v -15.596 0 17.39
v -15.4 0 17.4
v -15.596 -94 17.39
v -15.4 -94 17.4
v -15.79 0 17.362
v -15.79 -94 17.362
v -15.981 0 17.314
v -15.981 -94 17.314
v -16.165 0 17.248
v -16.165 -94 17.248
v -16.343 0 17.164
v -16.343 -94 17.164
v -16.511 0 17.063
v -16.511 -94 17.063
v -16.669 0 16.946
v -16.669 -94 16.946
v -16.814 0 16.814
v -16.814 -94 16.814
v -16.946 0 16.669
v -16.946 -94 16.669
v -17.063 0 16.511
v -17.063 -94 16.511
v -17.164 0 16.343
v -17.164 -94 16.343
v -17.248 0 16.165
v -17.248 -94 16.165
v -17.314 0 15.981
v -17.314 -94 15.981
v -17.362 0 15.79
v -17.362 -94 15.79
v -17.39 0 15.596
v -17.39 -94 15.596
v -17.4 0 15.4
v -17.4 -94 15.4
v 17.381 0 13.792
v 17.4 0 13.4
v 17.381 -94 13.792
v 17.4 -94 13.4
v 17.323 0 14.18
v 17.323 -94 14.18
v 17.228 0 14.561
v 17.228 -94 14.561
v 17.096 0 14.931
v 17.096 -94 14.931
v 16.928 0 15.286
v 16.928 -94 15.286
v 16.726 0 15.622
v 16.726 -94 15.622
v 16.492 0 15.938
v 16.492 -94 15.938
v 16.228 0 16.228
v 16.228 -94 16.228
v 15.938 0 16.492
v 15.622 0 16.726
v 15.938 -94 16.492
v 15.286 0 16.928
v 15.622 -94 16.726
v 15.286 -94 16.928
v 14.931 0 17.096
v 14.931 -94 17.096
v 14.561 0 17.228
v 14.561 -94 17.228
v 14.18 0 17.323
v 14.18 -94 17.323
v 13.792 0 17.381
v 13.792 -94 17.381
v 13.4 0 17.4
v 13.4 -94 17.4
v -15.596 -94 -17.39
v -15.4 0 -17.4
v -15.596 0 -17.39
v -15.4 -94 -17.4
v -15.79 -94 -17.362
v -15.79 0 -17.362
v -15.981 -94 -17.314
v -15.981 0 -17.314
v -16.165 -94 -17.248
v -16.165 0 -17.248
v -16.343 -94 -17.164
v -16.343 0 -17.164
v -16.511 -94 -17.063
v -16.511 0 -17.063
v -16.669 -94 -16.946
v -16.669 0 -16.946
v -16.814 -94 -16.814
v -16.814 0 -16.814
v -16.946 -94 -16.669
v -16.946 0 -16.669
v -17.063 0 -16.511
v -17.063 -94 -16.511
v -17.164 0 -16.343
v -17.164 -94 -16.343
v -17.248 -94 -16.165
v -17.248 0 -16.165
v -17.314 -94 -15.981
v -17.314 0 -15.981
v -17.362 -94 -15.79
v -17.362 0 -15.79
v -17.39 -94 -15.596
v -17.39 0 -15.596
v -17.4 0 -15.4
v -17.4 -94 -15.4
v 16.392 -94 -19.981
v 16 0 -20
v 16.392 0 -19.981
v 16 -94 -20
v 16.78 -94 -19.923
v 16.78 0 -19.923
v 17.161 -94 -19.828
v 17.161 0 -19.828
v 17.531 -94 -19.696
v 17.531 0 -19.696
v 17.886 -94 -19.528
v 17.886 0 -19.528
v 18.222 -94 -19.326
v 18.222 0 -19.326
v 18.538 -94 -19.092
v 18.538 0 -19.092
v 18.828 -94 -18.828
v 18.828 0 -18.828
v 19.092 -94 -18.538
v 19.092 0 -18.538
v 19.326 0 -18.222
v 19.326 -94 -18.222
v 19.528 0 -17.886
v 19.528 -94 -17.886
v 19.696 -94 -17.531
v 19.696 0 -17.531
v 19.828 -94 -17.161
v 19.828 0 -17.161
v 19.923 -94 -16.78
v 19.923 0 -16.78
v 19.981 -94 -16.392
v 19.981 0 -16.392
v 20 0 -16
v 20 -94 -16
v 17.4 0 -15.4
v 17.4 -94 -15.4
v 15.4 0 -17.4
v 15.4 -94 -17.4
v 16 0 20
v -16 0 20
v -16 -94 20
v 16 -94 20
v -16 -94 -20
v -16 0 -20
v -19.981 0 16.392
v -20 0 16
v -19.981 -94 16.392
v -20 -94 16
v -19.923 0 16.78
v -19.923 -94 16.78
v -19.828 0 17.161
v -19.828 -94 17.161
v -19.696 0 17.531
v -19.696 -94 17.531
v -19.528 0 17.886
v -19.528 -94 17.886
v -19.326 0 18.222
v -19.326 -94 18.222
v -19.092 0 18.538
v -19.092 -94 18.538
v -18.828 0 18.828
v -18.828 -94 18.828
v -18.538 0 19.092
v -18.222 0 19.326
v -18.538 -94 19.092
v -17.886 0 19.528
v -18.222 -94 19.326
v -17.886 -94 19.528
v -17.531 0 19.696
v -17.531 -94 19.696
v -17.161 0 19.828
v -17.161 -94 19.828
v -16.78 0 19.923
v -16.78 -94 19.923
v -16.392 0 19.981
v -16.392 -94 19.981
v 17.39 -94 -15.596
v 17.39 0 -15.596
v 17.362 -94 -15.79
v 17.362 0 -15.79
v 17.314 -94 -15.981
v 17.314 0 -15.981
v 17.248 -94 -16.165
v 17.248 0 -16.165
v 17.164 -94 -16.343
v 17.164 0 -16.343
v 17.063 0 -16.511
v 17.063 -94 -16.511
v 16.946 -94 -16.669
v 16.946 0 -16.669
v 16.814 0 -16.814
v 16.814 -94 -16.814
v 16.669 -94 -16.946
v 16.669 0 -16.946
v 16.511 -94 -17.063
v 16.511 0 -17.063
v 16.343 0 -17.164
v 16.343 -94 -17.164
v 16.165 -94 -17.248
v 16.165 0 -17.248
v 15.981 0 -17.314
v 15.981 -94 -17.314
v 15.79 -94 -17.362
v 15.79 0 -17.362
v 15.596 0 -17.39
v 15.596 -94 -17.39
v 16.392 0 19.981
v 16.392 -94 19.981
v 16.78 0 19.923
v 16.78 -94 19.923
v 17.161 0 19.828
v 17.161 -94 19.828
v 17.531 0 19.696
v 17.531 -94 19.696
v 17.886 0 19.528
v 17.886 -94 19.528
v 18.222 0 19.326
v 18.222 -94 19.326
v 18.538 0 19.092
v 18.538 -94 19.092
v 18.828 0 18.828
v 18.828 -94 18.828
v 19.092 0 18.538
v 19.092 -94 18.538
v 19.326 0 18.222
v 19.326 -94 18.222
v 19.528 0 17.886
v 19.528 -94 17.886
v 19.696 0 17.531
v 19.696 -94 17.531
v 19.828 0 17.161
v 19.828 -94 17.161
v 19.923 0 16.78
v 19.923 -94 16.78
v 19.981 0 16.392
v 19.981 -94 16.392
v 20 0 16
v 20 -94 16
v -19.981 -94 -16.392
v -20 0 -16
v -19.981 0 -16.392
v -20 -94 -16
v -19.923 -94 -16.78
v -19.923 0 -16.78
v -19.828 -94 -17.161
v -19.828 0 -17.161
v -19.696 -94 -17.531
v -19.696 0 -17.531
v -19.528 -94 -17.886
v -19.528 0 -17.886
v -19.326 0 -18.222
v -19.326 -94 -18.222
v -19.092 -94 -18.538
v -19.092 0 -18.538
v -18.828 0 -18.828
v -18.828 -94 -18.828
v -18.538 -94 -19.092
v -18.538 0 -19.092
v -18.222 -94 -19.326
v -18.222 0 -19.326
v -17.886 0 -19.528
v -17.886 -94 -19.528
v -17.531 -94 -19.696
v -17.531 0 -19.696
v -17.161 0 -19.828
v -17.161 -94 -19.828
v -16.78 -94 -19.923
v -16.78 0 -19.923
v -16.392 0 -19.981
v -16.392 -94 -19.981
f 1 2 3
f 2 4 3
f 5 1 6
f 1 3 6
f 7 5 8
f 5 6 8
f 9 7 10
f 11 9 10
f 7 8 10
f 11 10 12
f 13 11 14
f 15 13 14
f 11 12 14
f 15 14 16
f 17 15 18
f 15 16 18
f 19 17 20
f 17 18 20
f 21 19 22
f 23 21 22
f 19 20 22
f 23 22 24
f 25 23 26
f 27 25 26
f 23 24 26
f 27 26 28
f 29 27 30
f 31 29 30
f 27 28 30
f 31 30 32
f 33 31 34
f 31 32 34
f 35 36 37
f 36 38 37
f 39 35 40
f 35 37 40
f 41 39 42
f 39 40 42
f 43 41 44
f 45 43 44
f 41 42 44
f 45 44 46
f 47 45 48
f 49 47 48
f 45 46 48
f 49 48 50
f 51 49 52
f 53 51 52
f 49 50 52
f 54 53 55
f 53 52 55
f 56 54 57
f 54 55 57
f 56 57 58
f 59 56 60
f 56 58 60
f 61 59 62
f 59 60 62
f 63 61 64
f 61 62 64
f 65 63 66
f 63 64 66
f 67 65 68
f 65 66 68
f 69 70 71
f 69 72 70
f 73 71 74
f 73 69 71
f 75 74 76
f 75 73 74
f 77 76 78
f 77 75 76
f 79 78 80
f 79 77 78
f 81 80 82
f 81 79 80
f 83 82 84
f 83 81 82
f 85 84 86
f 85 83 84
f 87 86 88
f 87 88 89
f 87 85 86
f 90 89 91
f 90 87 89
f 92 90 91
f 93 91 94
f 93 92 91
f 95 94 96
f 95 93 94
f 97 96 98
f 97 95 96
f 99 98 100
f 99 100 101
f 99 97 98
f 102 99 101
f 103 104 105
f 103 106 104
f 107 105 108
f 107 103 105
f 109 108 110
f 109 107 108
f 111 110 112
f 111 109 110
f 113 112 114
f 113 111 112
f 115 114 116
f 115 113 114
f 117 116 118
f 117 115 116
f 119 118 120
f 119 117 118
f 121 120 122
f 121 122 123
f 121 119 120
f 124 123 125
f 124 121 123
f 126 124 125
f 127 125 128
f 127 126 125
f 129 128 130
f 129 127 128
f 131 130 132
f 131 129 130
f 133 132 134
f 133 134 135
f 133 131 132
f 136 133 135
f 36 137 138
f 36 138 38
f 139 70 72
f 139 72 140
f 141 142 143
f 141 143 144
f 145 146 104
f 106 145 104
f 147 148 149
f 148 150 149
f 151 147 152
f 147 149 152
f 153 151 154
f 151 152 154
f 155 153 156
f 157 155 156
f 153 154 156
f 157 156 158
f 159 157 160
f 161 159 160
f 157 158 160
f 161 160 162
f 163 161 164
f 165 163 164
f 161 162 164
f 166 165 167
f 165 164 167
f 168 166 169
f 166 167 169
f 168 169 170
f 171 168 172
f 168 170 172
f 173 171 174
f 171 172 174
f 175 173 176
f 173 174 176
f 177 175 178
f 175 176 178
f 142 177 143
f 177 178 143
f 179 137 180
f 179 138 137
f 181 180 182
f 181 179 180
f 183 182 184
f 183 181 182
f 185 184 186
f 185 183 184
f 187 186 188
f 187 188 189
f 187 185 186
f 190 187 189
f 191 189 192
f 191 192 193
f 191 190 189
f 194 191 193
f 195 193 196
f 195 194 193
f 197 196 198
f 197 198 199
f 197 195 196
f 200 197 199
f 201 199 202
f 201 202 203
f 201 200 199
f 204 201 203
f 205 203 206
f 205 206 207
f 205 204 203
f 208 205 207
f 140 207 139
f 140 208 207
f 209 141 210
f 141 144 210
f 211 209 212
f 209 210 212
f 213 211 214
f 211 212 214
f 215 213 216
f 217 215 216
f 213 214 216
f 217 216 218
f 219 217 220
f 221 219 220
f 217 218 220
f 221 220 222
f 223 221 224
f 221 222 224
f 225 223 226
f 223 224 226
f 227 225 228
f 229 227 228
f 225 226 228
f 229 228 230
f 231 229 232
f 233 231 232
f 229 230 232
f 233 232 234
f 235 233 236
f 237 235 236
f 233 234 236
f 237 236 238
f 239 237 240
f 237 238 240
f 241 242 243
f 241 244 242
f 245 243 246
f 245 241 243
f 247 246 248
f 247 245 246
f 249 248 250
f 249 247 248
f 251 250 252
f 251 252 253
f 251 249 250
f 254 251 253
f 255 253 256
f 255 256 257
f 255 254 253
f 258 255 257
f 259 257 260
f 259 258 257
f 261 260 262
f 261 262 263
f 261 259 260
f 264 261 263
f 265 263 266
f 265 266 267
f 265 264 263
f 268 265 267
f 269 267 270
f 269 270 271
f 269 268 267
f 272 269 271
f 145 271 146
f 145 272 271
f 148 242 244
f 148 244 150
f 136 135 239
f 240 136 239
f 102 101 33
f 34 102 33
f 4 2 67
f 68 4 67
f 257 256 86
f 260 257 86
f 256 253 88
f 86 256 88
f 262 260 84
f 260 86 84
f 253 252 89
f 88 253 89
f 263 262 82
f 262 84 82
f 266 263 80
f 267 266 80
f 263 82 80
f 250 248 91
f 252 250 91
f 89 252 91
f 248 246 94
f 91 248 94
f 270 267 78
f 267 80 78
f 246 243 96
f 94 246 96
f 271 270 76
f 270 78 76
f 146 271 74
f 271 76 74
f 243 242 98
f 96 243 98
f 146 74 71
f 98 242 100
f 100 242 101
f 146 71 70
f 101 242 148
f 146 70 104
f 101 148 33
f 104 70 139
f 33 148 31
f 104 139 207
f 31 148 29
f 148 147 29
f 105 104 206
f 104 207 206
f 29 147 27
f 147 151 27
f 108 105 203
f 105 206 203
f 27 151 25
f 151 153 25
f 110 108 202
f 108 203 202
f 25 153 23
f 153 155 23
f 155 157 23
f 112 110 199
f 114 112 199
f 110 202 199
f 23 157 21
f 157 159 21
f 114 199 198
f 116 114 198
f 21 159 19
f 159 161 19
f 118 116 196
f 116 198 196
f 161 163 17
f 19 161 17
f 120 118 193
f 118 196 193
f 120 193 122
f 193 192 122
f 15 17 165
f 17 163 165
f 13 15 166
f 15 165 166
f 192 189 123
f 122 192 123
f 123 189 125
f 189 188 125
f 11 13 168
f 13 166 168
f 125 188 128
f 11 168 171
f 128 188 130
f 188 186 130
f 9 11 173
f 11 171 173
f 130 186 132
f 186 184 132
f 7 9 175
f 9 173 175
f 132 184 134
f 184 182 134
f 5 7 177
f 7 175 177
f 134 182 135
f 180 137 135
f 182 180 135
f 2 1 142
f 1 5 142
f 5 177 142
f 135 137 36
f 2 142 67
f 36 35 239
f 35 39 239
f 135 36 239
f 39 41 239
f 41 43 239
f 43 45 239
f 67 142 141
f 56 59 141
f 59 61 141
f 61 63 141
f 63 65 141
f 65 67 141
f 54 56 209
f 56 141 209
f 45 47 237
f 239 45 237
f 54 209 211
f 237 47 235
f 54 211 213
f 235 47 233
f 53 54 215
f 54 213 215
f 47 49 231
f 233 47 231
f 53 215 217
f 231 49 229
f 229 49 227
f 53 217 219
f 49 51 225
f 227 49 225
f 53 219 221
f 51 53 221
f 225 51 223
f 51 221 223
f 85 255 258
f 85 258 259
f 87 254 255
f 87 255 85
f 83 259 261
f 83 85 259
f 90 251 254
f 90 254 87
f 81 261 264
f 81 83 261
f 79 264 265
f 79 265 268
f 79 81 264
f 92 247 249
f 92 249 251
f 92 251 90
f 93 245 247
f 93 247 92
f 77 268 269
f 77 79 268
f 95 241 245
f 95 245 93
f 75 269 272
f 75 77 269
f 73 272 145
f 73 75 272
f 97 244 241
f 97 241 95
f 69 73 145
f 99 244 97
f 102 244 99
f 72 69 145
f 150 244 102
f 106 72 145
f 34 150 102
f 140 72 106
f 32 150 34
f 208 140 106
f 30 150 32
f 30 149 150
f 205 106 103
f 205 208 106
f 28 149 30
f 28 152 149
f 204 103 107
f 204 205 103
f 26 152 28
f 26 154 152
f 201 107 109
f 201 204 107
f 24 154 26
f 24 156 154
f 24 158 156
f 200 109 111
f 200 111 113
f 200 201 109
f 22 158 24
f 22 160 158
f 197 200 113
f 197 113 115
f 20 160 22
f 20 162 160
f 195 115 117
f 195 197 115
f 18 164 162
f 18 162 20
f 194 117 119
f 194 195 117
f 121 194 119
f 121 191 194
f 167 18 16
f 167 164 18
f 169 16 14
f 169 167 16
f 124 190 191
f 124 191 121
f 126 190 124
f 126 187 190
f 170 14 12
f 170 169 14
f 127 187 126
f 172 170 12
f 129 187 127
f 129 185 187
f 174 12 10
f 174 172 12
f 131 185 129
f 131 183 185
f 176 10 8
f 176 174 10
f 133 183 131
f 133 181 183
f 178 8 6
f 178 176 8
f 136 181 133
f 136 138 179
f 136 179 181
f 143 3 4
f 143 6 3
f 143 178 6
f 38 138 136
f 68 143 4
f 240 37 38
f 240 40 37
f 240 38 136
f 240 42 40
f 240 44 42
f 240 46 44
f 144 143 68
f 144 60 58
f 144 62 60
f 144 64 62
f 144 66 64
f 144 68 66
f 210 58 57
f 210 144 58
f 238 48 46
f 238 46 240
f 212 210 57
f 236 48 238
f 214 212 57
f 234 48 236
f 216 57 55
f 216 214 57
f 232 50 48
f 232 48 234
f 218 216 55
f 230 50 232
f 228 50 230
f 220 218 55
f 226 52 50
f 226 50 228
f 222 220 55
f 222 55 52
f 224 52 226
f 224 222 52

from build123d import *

# Parameters (mm, degrees)
F0_W     = 40
F0_H     = 40
F0_W_2   = 34.8
F0_H_2   = 34.8
F1_DEPTH = 94
F2_R     = 4
F3_R     = 2


with BuildPart() as f1:
    # F0 (on Front) → F1 (new body)
    with BuildSketch(Plane.XZ):
        Rectangle(F0_W, F0_H)
        Rectangle(F0_W_2, F0_H_2, mode=Mode.SUBTRACT)
    extrude(amount=F1_DEPTH)

    # F2
    f2_edges = [f1.edges().sort_by_distance(p)[0] for p in [
        (20, -47, 20),
        (-20, -47, 20),
        (20, -47, -20),
        (-20, -47, -20),
        (17.4, -47, 17.4),
    ]]
    fillet(f2_edges, radius=F2_R)

    # F3
    f3_edges = [f1.edges().sort_by_distance(p)[0] for p in [
        (-17.4, -47, 17.4),
        (-17.4, -47, -17.4),
        (17.4, -47, -17.4),
        (16, -47, 20),
    ]]
    fillet(f3_edges, radius=F3_R)


solid = f1.part
